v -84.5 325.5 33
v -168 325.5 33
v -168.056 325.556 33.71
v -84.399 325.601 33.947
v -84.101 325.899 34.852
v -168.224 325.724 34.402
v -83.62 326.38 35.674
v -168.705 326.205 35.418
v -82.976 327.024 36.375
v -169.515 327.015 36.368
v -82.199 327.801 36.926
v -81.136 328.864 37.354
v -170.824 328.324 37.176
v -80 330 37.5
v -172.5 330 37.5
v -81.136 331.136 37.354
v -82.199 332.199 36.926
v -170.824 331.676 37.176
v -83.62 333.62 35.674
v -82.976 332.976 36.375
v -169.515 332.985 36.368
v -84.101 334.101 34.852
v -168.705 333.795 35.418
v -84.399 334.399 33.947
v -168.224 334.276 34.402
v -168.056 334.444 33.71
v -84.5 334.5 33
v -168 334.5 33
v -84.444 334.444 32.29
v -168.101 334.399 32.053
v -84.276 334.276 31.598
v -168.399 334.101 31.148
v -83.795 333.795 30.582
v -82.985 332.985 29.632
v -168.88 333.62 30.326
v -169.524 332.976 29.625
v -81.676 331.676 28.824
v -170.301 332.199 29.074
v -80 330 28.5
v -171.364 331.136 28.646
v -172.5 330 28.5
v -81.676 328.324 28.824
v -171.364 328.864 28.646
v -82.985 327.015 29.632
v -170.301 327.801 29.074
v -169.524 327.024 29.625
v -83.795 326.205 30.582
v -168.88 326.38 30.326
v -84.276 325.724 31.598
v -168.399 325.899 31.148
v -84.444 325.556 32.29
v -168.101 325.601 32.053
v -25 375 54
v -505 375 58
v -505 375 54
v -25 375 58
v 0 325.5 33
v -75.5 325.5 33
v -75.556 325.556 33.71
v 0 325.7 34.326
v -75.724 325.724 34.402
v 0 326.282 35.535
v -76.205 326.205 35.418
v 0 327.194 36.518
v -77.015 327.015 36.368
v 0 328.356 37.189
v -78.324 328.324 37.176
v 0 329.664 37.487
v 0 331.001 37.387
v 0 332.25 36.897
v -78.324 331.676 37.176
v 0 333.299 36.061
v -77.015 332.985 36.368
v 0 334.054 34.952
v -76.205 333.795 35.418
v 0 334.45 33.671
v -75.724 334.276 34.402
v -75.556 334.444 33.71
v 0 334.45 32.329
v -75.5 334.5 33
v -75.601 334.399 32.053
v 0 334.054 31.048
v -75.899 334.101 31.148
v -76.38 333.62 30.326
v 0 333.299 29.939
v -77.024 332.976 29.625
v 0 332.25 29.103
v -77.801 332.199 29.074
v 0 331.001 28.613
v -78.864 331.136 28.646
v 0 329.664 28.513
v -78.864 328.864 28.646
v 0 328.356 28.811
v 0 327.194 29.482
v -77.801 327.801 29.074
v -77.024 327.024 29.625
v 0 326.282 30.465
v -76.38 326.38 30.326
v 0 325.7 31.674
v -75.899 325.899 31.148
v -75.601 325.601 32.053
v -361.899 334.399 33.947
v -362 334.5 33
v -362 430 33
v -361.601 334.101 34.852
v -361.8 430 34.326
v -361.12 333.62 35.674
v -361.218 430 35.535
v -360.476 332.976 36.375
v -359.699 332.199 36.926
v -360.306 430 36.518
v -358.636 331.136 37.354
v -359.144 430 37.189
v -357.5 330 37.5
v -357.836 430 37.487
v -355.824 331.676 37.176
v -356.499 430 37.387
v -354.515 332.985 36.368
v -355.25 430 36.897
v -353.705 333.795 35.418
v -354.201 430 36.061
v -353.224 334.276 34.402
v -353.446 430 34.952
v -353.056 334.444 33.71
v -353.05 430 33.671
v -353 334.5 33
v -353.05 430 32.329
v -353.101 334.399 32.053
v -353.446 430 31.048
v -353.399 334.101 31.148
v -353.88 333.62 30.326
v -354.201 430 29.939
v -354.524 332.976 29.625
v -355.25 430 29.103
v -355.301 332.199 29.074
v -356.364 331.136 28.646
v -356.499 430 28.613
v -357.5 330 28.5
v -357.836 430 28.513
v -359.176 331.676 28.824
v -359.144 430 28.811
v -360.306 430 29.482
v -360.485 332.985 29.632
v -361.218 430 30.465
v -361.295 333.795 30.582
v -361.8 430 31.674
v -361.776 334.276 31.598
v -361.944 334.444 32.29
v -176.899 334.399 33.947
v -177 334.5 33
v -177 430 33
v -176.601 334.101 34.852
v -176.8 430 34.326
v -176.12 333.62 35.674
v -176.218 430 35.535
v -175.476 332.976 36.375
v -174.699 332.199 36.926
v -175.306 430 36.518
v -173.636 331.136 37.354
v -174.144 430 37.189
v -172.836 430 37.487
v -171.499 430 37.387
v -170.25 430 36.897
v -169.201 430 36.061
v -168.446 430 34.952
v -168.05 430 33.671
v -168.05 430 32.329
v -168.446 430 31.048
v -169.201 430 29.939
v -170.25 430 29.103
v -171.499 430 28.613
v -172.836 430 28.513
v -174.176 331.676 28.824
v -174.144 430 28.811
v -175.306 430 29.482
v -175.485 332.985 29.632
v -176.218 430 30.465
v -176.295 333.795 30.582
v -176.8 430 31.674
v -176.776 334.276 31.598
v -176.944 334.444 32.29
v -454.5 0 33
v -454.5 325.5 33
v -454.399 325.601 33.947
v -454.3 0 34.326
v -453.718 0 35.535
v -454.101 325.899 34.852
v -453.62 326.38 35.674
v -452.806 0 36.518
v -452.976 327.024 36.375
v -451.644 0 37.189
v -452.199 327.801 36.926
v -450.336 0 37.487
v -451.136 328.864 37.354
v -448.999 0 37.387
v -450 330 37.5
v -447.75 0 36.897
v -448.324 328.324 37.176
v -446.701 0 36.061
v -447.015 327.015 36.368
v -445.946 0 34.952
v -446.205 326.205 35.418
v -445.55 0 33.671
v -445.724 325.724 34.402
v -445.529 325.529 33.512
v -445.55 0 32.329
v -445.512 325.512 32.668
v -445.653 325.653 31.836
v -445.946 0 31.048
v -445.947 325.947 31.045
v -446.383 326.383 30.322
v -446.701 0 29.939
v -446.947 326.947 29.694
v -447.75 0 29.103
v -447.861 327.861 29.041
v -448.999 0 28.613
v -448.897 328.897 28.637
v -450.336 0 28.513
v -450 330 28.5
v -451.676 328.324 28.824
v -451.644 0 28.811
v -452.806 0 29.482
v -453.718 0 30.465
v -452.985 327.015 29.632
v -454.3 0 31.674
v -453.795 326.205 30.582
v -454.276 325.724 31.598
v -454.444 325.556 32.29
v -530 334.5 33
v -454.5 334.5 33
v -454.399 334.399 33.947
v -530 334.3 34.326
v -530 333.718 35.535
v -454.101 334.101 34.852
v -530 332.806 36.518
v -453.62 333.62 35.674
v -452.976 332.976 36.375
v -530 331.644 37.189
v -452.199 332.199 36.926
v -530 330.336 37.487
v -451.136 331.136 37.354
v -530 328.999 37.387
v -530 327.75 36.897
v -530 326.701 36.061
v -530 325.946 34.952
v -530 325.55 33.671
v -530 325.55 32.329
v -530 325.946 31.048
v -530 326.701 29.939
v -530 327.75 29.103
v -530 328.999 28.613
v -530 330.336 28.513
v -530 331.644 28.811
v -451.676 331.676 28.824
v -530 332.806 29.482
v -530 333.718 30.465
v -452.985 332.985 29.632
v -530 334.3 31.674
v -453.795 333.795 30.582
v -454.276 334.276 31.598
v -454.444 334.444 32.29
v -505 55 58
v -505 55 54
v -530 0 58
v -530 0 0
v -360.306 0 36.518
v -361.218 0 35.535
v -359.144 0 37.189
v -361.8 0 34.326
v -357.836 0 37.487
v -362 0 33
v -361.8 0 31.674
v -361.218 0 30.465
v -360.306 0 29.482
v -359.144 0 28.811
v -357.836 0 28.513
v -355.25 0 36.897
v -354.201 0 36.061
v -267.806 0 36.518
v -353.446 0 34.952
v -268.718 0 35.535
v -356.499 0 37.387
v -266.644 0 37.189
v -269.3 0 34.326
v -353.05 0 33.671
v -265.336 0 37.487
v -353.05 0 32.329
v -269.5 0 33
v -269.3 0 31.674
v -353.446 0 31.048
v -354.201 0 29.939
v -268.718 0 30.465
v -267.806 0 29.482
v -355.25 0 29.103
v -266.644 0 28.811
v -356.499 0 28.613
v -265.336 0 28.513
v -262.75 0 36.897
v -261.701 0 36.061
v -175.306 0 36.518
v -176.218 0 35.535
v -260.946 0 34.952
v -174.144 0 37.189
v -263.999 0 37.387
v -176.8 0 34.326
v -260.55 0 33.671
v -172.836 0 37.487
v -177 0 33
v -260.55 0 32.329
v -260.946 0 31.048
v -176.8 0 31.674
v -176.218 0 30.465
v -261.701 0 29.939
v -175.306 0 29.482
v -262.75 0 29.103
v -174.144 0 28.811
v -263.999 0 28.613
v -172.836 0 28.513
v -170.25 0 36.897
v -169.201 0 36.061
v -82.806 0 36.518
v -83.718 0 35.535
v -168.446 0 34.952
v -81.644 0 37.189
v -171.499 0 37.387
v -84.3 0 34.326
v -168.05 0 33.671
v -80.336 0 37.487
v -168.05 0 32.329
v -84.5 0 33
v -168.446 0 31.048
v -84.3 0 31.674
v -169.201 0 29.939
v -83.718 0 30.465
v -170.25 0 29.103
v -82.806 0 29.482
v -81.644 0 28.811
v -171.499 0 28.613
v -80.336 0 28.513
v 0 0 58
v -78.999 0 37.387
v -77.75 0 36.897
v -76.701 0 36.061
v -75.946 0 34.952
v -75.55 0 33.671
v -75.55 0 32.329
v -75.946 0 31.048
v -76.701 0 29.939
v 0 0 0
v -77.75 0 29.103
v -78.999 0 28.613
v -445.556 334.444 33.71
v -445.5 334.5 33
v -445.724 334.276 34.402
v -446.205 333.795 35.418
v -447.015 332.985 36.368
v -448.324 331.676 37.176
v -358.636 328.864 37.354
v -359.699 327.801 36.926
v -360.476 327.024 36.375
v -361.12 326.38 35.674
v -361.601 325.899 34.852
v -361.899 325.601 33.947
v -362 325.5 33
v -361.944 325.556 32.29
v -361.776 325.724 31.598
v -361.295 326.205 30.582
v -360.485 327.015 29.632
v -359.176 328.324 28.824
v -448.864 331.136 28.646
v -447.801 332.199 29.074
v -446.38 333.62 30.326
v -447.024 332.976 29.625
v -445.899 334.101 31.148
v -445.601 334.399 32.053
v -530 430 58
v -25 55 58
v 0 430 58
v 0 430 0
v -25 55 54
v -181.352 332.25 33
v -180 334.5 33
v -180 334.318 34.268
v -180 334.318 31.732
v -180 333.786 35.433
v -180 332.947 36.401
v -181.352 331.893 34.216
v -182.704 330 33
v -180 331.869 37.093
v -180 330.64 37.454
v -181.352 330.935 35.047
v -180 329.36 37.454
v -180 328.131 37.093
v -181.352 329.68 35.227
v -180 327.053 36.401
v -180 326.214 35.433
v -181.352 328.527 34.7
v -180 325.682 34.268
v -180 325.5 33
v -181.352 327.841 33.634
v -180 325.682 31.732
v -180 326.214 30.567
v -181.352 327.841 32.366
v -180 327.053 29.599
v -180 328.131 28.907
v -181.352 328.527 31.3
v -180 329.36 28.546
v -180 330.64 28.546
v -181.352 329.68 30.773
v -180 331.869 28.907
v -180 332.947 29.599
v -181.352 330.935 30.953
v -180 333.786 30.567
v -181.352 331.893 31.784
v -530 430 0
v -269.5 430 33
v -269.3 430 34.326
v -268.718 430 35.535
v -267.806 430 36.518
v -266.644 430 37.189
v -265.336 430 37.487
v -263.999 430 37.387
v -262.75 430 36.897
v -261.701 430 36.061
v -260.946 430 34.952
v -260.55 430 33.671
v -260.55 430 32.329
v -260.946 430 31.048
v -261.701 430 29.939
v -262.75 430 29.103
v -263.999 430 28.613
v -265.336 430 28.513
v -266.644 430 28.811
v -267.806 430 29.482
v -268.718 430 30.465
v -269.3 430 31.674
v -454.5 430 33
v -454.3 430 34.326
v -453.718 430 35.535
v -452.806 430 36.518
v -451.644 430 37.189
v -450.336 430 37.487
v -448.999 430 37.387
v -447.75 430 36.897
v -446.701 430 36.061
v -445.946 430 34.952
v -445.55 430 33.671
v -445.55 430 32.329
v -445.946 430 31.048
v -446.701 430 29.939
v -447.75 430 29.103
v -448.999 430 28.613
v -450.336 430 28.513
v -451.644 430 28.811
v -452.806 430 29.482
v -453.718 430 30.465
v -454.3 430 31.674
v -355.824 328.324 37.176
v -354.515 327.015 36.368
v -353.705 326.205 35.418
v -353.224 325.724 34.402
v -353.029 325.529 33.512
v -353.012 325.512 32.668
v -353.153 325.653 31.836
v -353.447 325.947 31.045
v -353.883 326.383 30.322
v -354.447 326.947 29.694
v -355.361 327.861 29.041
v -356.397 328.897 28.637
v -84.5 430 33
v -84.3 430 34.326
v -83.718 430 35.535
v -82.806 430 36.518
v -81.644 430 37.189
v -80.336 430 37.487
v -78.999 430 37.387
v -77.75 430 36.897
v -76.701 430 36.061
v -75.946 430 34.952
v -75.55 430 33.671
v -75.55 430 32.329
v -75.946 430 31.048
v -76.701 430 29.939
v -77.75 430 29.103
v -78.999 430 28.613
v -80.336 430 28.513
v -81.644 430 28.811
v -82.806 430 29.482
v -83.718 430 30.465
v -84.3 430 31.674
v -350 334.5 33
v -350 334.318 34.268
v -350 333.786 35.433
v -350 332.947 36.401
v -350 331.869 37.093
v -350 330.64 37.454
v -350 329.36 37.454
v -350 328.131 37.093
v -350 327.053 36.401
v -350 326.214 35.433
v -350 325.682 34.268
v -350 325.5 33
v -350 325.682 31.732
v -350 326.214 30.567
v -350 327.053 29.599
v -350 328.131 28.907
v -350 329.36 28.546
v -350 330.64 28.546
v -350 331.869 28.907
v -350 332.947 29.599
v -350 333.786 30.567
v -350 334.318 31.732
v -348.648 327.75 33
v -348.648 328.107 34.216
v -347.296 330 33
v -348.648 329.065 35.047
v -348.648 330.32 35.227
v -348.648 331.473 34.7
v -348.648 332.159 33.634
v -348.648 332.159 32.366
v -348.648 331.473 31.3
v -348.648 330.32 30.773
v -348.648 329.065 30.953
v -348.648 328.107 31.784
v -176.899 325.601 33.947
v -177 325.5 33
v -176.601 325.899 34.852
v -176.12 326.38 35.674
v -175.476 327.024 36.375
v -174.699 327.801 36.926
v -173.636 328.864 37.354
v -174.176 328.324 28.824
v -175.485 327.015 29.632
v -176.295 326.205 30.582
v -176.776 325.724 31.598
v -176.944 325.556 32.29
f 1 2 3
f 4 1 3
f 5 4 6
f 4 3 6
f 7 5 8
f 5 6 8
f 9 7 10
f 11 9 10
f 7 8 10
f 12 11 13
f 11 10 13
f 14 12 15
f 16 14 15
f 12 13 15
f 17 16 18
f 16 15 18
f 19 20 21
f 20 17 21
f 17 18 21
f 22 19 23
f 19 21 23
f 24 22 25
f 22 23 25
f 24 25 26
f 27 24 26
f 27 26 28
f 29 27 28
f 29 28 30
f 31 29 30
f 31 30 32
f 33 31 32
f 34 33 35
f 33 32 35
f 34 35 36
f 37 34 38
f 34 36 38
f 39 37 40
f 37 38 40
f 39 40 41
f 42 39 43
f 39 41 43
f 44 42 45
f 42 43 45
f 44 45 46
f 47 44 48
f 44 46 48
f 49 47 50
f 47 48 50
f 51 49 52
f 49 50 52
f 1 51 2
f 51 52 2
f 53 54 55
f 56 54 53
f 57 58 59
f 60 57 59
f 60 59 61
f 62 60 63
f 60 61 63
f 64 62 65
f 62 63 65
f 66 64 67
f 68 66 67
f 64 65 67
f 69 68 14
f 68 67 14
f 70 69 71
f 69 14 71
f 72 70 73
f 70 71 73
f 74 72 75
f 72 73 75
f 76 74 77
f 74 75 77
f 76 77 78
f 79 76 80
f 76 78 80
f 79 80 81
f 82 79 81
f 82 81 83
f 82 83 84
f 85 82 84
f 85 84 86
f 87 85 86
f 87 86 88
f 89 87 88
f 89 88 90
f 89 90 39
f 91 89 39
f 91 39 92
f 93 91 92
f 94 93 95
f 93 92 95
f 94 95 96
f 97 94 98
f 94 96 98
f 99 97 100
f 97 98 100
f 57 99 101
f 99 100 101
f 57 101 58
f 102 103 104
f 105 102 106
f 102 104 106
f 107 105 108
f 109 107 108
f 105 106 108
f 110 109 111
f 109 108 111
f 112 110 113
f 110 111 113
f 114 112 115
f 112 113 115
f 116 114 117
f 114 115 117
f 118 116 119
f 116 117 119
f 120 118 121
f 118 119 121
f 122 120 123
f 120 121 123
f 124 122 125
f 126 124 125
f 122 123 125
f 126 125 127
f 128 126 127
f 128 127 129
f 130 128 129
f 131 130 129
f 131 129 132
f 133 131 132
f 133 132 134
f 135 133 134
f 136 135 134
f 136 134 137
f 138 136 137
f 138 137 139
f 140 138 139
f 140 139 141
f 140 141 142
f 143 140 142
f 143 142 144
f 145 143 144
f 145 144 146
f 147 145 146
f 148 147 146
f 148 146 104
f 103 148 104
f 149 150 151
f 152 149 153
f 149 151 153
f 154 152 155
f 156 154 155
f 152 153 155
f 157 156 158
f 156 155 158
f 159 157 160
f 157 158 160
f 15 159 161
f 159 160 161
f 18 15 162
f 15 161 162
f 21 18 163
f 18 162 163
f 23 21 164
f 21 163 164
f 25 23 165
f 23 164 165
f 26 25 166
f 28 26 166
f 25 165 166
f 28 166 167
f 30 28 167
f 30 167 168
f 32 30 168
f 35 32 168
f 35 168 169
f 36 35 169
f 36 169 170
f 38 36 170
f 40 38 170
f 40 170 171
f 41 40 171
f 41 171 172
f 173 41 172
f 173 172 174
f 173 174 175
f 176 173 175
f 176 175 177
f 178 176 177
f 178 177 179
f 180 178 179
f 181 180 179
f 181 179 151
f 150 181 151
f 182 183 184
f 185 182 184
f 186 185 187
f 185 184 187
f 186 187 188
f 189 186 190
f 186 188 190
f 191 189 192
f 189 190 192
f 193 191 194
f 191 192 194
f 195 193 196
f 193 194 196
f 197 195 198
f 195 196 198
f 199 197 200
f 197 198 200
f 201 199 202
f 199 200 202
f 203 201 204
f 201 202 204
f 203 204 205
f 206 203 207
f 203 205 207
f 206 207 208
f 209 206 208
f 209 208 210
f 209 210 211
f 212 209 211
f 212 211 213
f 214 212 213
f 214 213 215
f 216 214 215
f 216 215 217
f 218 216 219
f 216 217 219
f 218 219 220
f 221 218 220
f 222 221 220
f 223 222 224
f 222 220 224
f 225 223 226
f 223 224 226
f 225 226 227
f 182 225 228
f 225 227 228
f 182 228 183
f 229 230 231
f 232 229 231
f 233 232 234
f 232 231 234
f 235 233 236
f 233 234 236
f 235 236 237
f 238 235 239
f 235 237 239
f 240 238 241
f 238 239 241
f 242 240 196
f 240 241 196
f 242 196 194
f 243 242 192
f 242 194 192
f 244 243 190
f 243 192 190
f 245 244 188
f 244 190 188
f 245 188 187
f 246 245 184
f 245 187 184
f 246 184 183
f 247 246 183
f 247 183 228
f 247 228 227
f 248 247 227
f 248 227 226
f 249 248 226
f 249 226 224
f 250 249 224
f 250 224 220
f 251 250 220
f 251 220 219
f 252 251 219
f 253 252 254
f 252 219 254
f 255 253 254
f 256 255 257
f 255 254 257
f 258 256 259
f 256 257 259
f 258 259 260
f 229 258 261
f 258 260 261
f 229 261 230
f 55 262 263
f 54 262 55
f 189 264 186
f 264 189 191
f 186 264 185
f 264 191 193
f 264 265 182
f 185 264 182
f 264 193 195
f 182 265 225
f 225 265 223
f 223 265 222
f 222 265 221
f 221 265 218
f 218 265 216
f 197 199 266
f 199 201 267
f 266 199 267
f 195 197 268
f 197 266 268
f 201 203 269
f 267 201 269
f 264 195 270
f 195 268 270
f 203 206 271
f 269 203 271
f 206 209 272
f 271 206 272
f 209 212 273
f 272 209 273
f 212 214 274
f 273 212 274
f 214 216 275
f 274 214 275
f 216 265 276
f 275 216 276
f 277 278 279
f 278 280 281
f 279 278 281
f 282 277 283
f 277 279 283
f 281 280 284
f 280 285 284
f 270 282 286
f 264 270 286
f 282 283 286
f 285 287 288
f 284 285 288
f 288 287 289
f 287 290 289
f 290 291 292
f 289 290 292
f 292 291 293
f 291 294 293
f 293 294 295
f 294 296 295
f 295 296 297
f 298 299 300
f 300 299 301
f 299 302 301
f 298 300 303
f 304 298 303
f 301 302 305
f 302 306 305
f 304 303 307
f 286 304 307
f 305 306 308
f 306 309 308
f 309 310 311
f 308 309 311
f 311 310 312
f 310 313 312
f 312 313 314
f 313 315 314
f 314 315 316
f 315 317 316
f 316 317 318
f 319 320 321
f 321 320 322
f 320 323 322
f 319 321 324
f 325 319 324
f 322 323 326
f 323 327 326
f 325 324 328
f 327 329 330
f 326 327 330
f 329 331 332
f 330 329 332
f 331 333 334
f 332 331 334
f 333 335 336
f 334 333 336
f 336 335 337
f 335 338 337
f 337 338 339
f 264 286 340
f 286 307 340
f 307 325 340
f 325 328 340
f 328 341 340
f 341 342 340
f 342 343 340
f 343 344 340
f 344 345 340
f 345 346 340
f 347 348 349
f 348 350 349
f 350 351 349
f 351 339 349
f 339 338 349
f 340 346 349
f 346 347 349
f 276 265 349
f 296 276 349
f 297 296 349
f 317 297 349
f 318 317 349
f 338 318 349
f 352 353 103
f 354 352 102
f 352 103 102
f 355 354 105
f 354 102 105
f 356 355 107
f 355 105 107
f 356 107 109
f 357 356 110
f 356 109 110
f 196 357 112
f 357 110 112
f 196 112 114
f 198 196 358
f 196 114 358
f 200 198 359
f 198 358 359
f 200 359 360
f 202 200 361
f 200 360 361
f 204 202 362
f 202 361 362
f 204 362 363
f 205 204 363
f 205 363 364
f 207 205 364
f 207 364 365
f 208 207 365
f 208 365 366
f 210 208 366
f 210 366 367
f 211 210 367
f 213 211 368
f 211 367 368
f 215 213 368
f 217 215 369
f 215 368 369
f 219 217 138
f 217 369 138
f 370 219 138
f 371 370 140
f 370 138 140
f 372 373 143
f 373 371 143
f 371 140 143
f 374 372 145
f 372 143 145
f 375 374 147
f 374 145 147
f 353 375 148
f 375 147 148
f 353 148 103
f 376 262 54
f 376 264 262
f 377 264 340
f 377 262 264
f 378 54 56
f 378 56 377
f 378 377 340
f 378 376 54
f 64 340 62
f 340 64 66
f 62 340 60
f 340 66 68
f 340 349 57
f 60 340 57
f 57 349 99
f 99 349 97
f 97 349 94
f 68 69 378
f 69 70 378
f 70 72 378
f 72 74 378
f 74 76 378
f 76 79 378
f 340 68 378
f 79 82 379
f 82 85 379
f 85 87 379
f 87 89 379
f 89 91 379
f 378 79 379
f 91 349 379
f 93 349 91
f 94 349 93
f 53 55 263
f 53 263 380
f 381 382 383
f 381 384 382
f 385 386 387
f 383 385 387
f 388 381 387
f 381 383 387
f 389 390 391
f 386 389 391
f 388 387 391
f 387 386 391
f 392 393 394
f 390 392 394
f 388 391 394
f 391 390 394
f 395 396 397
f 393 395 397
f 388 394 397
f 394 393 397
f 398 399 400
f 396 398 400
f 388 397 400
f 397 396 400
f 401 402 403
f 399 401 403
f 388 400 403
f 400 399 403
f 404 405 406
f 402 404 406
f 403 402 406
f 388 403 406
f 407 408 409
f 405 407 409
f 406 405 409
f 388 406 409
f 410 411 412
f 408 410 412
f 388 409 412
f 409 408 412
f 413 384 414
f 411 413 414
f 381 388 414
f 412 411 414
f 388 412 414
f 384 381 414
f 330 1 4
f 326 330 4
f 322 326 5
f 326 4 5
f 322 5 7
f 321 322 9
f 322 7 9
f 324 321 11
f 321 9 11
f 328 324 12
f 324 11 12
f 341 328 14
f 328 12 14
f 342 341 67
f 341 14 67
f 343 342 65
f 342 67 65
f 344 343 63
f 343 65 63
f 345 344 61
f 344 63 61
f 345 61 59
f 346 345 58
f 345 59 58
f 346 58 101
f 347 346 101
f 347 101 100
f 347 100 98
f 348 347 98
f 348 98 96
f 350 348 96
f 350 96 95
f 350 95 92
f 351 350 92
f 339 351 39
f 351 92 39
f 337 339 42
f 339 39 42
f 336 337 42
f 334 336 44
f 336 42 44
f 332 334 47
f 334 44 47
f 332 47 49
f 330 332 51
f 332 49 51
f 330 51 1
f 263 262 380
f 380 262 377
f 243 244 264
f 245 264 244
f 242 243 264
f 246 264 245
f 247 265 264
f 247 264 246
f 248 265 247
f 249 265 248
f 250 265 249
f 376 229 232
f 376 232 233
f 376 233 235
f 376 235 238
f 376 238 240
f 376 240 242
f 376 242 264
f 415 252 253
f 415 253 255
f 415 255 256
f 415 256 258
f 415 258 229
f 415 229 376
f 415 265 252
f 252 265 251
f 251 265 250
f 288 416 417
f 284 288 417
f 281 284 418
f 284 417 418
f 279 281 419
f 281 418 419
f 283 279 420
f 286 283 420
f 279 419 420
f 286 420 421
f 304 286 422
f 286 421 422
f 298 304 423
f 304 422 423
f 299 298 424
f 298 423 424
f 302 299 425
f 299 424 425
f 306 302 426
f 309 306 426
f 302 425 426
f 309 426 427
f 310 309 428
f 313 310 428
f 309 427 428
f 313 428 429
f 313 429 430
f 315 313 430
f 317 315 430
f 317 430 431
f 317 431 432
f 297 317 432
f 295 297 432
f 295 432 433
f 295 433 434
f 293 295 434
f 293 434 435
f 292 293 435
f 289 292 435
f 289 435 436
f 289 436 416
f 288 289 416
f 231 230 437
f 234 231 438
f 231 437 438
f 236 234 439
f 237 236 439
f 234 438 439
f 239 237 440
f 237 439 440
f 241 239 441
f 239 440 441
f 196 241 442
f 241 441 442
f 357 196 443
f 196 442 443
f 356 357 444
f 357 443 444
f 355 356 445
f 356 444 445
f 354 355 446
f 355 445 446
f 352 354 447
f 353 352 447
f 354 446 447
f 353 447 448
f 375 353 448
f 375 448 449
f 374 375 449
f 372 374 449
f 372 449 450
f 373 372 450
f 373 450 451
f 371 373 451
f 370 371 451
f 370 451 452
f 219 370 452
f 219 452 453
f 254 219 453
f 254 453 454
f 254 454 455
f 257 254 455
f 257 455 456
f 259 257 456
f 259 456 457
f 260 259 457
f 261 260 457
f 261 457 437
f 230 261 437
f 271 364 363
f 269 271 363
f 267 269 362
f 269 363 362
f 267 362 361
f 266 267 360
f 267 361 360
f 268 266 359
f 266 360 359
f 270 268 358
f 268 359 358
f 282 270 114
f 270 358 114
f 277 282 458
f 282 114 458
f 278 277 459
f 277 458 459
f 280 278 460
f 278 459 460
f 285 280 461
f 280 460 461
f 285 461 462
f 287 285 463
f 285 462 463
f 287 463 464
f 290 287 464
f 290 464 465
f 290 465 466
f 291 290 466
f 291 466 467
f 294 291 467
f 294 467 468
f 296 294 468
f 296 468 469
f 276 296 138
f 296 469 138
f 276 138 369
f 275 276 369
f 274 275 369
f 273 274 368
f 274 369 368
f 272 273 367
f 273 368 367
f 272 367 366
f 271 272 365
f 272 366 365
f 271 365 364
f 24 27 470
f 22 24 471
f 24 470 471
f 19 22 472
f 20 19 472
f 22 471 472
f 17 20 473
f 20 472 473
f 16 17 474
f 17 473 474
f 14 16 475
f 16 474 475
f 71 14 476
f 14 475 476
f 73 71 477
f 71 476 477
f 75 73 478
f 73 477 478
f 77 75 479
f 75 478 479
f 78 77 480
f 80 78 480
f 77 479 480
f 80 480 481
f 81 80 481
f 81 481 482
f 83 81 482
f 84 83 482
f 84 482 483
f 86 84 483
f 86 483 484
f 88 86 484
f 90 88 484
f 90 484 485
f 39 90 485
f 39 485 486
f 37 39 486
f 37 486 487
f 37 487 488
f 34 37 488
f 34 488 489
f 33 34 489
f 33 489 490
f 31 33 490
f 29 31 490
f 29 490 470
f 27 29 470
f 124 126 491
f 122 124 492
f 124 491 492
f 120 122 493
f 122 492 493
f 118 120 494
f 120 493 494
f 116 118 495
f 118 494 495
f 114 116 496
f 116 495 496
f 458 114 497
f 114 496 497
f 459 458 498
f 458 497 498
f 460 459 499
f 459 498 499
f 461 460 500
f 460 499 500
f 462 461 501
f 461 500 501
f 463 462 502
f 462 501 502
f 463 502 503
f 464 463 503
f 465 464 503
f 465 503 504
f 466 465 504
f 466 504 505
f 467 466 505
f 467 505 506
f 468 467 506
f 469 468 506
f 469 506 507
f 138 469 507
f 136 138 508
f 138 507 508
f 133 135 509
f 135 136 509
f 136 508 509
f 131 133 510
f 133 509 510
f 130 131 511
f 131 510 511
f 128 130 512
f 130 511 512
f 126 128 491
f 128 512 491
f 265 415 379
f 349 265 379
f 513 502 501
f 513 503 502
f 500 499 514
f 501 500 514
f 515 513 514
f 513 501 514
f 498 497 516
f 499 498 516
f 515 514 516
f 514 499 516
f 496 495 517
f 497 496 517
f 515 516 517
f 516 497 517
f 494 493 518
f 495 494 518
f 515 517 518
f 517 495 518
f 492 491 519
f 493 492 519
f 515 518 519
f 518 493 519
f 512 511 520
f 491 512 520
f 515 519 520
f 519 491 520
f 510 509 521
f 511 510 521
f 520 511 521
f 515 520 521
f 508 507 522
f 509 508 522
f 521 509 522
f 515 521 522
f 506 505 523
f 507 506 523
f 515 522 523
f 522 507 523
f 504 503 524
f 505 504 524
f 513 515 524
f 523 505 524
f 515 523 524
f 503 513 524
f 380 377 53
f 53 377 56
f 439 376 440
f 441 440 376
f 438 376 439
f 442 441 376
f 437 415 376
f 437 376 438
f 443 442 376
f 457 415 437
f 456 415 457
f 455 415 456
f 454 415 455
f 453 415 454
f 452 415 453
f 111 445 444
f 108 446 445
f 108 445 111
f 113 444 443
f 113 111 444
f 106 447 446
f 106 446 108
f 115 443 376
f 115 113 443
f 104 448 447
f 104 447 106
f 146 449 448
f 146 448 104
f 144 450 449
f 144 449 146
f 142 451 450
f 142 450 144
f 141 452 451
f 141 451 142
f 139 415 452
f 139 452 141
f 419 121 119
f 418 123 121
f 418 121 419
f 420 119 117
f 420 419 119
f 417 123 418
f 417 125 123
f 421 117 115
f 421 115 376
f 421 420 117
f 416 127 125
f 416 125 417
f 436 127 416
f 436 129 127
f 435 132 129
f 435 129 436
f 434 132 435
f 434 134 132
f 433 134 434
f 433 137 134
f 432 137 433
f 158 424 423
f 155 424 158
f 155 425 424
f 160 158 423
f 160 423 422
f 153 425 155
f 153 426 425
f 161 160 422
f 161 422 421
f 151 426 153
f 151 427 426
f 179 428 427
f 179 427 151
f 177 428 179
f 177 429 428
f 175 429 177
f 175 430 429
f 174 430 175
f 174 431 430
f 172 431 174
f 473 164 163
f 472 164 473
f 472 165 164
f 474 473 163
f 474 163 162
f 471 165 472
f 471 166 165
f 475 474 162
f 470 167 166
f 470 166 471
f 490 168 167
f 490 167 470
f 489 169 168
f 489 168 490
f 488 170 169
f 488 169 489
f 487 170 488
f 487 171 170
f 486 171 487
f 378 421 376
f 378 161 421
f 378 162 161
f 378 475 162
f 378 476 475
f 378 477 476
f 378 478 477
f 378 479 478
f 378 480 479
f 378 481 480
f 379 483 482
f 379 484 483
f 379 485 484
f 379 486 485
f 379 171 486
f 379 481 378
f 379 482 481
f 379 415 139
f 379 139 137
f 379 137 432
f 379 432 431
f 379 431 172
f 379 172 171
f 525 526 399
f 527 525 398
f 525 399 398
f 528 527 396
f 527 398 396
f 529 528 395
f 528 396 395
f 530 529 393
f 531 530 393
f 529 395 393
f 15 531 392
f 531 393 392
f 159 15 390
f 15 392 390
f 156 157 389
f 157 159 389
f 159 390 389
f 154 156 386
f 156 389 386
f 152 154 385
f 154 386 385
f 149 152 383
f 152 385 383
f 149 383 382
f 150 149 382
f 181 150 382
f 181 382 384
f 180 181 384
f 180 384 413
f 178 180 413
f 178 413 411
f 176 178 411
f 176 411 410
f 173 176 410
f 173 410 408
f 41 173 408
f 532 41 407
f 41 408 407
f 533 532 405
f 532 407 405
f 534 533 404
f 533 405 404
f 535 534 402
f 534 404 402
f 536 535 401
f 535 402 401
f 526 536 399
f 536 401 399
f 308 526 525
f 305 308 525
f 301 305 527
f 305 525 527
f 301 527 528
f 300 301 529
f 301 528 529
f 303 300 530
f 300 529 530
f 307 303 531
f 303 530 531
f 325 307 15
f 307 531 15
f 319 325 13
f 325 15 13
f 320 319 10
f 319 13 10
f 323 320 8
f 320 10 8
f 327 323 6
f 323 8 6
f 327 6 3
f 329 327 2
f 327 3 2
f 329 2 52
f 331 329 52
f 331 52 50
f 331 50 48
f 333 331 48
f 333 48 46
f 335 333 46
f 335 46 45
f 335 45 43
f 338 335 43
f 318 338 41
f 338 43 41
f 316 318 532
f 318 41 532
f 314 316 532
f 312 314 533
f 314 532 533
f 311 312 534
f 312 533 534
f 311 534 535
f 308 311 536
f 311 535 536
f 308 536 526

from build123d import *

# Parameters (mm, degrees)
F0_W     = 530
F0_H     = 430
F1_DEPTH = 58
F3_D     = 9
F5_D     = 9
F5_DEPTH = 180
F5_TIP   = 2.7038727856
F7_D     = 9
F7_DEPTH = 180
F7_TIP   = 2.7038727856
F8_W     = 480
F8_H     = 320
F9_DEPTH = 4


# Not quite as in the source:
# - a feature names something its author has since deleted; it is built from what else it names


with BuildPart() as f1:
    # F0 (on Top) → F1 (new body)
    with BuildSketch(Plane.XY):
        with Locations((-265, 215)):
            Rectangle(F0_W, F0_H)
    extrude(amount=F1_DEPTH)

    # F3 (through all)
    with Locations(Plane.XZ):
        with Locations((-450, 33), (-357.5, 33), (-265, 33), (-172.5, 33), (-80, 33)):
            Hole(F3_D / 2)

    # F5
    with Locations(Plane(origin=(-530, 0, 0), x_dir=(0, -1, 0), z_dir=(-1, 0, 0))):
        with Locations((-330, 33)):
            Hole(F5_D / 2, depth=F5_DEPTH)
            with Locations((0, 0, -(F5_DEPTH + F5_TIP / 2))):  # 118° drill point
                Cone(0, F5_D / 2, F5_TIP, mode=Mode.SUBTRACT)

    # F7
    with Locations(Plane.YZ):
        with Locations((330, 33)):
            Hole(F7_D / 2, depth=F7_DEPTH)
            with Locations((0, 0, -(F7_DEPTH + F7_TIP / 2))):  # 118° drill point
                Cone(0, F7_D / 2, F7_TIP, mode=Mode.SUBTRACT)

    # F8 (on face) → F9 (cut)
    with BuildSketch(Plane.XY.offset(58)):
        with Locations((-265, 215)):
            Rectangle(F8_W, F8_H)
    extrude(amount=-F9_DEPTH, mode=Mode.SUBTRACT)


solid = f1.part
